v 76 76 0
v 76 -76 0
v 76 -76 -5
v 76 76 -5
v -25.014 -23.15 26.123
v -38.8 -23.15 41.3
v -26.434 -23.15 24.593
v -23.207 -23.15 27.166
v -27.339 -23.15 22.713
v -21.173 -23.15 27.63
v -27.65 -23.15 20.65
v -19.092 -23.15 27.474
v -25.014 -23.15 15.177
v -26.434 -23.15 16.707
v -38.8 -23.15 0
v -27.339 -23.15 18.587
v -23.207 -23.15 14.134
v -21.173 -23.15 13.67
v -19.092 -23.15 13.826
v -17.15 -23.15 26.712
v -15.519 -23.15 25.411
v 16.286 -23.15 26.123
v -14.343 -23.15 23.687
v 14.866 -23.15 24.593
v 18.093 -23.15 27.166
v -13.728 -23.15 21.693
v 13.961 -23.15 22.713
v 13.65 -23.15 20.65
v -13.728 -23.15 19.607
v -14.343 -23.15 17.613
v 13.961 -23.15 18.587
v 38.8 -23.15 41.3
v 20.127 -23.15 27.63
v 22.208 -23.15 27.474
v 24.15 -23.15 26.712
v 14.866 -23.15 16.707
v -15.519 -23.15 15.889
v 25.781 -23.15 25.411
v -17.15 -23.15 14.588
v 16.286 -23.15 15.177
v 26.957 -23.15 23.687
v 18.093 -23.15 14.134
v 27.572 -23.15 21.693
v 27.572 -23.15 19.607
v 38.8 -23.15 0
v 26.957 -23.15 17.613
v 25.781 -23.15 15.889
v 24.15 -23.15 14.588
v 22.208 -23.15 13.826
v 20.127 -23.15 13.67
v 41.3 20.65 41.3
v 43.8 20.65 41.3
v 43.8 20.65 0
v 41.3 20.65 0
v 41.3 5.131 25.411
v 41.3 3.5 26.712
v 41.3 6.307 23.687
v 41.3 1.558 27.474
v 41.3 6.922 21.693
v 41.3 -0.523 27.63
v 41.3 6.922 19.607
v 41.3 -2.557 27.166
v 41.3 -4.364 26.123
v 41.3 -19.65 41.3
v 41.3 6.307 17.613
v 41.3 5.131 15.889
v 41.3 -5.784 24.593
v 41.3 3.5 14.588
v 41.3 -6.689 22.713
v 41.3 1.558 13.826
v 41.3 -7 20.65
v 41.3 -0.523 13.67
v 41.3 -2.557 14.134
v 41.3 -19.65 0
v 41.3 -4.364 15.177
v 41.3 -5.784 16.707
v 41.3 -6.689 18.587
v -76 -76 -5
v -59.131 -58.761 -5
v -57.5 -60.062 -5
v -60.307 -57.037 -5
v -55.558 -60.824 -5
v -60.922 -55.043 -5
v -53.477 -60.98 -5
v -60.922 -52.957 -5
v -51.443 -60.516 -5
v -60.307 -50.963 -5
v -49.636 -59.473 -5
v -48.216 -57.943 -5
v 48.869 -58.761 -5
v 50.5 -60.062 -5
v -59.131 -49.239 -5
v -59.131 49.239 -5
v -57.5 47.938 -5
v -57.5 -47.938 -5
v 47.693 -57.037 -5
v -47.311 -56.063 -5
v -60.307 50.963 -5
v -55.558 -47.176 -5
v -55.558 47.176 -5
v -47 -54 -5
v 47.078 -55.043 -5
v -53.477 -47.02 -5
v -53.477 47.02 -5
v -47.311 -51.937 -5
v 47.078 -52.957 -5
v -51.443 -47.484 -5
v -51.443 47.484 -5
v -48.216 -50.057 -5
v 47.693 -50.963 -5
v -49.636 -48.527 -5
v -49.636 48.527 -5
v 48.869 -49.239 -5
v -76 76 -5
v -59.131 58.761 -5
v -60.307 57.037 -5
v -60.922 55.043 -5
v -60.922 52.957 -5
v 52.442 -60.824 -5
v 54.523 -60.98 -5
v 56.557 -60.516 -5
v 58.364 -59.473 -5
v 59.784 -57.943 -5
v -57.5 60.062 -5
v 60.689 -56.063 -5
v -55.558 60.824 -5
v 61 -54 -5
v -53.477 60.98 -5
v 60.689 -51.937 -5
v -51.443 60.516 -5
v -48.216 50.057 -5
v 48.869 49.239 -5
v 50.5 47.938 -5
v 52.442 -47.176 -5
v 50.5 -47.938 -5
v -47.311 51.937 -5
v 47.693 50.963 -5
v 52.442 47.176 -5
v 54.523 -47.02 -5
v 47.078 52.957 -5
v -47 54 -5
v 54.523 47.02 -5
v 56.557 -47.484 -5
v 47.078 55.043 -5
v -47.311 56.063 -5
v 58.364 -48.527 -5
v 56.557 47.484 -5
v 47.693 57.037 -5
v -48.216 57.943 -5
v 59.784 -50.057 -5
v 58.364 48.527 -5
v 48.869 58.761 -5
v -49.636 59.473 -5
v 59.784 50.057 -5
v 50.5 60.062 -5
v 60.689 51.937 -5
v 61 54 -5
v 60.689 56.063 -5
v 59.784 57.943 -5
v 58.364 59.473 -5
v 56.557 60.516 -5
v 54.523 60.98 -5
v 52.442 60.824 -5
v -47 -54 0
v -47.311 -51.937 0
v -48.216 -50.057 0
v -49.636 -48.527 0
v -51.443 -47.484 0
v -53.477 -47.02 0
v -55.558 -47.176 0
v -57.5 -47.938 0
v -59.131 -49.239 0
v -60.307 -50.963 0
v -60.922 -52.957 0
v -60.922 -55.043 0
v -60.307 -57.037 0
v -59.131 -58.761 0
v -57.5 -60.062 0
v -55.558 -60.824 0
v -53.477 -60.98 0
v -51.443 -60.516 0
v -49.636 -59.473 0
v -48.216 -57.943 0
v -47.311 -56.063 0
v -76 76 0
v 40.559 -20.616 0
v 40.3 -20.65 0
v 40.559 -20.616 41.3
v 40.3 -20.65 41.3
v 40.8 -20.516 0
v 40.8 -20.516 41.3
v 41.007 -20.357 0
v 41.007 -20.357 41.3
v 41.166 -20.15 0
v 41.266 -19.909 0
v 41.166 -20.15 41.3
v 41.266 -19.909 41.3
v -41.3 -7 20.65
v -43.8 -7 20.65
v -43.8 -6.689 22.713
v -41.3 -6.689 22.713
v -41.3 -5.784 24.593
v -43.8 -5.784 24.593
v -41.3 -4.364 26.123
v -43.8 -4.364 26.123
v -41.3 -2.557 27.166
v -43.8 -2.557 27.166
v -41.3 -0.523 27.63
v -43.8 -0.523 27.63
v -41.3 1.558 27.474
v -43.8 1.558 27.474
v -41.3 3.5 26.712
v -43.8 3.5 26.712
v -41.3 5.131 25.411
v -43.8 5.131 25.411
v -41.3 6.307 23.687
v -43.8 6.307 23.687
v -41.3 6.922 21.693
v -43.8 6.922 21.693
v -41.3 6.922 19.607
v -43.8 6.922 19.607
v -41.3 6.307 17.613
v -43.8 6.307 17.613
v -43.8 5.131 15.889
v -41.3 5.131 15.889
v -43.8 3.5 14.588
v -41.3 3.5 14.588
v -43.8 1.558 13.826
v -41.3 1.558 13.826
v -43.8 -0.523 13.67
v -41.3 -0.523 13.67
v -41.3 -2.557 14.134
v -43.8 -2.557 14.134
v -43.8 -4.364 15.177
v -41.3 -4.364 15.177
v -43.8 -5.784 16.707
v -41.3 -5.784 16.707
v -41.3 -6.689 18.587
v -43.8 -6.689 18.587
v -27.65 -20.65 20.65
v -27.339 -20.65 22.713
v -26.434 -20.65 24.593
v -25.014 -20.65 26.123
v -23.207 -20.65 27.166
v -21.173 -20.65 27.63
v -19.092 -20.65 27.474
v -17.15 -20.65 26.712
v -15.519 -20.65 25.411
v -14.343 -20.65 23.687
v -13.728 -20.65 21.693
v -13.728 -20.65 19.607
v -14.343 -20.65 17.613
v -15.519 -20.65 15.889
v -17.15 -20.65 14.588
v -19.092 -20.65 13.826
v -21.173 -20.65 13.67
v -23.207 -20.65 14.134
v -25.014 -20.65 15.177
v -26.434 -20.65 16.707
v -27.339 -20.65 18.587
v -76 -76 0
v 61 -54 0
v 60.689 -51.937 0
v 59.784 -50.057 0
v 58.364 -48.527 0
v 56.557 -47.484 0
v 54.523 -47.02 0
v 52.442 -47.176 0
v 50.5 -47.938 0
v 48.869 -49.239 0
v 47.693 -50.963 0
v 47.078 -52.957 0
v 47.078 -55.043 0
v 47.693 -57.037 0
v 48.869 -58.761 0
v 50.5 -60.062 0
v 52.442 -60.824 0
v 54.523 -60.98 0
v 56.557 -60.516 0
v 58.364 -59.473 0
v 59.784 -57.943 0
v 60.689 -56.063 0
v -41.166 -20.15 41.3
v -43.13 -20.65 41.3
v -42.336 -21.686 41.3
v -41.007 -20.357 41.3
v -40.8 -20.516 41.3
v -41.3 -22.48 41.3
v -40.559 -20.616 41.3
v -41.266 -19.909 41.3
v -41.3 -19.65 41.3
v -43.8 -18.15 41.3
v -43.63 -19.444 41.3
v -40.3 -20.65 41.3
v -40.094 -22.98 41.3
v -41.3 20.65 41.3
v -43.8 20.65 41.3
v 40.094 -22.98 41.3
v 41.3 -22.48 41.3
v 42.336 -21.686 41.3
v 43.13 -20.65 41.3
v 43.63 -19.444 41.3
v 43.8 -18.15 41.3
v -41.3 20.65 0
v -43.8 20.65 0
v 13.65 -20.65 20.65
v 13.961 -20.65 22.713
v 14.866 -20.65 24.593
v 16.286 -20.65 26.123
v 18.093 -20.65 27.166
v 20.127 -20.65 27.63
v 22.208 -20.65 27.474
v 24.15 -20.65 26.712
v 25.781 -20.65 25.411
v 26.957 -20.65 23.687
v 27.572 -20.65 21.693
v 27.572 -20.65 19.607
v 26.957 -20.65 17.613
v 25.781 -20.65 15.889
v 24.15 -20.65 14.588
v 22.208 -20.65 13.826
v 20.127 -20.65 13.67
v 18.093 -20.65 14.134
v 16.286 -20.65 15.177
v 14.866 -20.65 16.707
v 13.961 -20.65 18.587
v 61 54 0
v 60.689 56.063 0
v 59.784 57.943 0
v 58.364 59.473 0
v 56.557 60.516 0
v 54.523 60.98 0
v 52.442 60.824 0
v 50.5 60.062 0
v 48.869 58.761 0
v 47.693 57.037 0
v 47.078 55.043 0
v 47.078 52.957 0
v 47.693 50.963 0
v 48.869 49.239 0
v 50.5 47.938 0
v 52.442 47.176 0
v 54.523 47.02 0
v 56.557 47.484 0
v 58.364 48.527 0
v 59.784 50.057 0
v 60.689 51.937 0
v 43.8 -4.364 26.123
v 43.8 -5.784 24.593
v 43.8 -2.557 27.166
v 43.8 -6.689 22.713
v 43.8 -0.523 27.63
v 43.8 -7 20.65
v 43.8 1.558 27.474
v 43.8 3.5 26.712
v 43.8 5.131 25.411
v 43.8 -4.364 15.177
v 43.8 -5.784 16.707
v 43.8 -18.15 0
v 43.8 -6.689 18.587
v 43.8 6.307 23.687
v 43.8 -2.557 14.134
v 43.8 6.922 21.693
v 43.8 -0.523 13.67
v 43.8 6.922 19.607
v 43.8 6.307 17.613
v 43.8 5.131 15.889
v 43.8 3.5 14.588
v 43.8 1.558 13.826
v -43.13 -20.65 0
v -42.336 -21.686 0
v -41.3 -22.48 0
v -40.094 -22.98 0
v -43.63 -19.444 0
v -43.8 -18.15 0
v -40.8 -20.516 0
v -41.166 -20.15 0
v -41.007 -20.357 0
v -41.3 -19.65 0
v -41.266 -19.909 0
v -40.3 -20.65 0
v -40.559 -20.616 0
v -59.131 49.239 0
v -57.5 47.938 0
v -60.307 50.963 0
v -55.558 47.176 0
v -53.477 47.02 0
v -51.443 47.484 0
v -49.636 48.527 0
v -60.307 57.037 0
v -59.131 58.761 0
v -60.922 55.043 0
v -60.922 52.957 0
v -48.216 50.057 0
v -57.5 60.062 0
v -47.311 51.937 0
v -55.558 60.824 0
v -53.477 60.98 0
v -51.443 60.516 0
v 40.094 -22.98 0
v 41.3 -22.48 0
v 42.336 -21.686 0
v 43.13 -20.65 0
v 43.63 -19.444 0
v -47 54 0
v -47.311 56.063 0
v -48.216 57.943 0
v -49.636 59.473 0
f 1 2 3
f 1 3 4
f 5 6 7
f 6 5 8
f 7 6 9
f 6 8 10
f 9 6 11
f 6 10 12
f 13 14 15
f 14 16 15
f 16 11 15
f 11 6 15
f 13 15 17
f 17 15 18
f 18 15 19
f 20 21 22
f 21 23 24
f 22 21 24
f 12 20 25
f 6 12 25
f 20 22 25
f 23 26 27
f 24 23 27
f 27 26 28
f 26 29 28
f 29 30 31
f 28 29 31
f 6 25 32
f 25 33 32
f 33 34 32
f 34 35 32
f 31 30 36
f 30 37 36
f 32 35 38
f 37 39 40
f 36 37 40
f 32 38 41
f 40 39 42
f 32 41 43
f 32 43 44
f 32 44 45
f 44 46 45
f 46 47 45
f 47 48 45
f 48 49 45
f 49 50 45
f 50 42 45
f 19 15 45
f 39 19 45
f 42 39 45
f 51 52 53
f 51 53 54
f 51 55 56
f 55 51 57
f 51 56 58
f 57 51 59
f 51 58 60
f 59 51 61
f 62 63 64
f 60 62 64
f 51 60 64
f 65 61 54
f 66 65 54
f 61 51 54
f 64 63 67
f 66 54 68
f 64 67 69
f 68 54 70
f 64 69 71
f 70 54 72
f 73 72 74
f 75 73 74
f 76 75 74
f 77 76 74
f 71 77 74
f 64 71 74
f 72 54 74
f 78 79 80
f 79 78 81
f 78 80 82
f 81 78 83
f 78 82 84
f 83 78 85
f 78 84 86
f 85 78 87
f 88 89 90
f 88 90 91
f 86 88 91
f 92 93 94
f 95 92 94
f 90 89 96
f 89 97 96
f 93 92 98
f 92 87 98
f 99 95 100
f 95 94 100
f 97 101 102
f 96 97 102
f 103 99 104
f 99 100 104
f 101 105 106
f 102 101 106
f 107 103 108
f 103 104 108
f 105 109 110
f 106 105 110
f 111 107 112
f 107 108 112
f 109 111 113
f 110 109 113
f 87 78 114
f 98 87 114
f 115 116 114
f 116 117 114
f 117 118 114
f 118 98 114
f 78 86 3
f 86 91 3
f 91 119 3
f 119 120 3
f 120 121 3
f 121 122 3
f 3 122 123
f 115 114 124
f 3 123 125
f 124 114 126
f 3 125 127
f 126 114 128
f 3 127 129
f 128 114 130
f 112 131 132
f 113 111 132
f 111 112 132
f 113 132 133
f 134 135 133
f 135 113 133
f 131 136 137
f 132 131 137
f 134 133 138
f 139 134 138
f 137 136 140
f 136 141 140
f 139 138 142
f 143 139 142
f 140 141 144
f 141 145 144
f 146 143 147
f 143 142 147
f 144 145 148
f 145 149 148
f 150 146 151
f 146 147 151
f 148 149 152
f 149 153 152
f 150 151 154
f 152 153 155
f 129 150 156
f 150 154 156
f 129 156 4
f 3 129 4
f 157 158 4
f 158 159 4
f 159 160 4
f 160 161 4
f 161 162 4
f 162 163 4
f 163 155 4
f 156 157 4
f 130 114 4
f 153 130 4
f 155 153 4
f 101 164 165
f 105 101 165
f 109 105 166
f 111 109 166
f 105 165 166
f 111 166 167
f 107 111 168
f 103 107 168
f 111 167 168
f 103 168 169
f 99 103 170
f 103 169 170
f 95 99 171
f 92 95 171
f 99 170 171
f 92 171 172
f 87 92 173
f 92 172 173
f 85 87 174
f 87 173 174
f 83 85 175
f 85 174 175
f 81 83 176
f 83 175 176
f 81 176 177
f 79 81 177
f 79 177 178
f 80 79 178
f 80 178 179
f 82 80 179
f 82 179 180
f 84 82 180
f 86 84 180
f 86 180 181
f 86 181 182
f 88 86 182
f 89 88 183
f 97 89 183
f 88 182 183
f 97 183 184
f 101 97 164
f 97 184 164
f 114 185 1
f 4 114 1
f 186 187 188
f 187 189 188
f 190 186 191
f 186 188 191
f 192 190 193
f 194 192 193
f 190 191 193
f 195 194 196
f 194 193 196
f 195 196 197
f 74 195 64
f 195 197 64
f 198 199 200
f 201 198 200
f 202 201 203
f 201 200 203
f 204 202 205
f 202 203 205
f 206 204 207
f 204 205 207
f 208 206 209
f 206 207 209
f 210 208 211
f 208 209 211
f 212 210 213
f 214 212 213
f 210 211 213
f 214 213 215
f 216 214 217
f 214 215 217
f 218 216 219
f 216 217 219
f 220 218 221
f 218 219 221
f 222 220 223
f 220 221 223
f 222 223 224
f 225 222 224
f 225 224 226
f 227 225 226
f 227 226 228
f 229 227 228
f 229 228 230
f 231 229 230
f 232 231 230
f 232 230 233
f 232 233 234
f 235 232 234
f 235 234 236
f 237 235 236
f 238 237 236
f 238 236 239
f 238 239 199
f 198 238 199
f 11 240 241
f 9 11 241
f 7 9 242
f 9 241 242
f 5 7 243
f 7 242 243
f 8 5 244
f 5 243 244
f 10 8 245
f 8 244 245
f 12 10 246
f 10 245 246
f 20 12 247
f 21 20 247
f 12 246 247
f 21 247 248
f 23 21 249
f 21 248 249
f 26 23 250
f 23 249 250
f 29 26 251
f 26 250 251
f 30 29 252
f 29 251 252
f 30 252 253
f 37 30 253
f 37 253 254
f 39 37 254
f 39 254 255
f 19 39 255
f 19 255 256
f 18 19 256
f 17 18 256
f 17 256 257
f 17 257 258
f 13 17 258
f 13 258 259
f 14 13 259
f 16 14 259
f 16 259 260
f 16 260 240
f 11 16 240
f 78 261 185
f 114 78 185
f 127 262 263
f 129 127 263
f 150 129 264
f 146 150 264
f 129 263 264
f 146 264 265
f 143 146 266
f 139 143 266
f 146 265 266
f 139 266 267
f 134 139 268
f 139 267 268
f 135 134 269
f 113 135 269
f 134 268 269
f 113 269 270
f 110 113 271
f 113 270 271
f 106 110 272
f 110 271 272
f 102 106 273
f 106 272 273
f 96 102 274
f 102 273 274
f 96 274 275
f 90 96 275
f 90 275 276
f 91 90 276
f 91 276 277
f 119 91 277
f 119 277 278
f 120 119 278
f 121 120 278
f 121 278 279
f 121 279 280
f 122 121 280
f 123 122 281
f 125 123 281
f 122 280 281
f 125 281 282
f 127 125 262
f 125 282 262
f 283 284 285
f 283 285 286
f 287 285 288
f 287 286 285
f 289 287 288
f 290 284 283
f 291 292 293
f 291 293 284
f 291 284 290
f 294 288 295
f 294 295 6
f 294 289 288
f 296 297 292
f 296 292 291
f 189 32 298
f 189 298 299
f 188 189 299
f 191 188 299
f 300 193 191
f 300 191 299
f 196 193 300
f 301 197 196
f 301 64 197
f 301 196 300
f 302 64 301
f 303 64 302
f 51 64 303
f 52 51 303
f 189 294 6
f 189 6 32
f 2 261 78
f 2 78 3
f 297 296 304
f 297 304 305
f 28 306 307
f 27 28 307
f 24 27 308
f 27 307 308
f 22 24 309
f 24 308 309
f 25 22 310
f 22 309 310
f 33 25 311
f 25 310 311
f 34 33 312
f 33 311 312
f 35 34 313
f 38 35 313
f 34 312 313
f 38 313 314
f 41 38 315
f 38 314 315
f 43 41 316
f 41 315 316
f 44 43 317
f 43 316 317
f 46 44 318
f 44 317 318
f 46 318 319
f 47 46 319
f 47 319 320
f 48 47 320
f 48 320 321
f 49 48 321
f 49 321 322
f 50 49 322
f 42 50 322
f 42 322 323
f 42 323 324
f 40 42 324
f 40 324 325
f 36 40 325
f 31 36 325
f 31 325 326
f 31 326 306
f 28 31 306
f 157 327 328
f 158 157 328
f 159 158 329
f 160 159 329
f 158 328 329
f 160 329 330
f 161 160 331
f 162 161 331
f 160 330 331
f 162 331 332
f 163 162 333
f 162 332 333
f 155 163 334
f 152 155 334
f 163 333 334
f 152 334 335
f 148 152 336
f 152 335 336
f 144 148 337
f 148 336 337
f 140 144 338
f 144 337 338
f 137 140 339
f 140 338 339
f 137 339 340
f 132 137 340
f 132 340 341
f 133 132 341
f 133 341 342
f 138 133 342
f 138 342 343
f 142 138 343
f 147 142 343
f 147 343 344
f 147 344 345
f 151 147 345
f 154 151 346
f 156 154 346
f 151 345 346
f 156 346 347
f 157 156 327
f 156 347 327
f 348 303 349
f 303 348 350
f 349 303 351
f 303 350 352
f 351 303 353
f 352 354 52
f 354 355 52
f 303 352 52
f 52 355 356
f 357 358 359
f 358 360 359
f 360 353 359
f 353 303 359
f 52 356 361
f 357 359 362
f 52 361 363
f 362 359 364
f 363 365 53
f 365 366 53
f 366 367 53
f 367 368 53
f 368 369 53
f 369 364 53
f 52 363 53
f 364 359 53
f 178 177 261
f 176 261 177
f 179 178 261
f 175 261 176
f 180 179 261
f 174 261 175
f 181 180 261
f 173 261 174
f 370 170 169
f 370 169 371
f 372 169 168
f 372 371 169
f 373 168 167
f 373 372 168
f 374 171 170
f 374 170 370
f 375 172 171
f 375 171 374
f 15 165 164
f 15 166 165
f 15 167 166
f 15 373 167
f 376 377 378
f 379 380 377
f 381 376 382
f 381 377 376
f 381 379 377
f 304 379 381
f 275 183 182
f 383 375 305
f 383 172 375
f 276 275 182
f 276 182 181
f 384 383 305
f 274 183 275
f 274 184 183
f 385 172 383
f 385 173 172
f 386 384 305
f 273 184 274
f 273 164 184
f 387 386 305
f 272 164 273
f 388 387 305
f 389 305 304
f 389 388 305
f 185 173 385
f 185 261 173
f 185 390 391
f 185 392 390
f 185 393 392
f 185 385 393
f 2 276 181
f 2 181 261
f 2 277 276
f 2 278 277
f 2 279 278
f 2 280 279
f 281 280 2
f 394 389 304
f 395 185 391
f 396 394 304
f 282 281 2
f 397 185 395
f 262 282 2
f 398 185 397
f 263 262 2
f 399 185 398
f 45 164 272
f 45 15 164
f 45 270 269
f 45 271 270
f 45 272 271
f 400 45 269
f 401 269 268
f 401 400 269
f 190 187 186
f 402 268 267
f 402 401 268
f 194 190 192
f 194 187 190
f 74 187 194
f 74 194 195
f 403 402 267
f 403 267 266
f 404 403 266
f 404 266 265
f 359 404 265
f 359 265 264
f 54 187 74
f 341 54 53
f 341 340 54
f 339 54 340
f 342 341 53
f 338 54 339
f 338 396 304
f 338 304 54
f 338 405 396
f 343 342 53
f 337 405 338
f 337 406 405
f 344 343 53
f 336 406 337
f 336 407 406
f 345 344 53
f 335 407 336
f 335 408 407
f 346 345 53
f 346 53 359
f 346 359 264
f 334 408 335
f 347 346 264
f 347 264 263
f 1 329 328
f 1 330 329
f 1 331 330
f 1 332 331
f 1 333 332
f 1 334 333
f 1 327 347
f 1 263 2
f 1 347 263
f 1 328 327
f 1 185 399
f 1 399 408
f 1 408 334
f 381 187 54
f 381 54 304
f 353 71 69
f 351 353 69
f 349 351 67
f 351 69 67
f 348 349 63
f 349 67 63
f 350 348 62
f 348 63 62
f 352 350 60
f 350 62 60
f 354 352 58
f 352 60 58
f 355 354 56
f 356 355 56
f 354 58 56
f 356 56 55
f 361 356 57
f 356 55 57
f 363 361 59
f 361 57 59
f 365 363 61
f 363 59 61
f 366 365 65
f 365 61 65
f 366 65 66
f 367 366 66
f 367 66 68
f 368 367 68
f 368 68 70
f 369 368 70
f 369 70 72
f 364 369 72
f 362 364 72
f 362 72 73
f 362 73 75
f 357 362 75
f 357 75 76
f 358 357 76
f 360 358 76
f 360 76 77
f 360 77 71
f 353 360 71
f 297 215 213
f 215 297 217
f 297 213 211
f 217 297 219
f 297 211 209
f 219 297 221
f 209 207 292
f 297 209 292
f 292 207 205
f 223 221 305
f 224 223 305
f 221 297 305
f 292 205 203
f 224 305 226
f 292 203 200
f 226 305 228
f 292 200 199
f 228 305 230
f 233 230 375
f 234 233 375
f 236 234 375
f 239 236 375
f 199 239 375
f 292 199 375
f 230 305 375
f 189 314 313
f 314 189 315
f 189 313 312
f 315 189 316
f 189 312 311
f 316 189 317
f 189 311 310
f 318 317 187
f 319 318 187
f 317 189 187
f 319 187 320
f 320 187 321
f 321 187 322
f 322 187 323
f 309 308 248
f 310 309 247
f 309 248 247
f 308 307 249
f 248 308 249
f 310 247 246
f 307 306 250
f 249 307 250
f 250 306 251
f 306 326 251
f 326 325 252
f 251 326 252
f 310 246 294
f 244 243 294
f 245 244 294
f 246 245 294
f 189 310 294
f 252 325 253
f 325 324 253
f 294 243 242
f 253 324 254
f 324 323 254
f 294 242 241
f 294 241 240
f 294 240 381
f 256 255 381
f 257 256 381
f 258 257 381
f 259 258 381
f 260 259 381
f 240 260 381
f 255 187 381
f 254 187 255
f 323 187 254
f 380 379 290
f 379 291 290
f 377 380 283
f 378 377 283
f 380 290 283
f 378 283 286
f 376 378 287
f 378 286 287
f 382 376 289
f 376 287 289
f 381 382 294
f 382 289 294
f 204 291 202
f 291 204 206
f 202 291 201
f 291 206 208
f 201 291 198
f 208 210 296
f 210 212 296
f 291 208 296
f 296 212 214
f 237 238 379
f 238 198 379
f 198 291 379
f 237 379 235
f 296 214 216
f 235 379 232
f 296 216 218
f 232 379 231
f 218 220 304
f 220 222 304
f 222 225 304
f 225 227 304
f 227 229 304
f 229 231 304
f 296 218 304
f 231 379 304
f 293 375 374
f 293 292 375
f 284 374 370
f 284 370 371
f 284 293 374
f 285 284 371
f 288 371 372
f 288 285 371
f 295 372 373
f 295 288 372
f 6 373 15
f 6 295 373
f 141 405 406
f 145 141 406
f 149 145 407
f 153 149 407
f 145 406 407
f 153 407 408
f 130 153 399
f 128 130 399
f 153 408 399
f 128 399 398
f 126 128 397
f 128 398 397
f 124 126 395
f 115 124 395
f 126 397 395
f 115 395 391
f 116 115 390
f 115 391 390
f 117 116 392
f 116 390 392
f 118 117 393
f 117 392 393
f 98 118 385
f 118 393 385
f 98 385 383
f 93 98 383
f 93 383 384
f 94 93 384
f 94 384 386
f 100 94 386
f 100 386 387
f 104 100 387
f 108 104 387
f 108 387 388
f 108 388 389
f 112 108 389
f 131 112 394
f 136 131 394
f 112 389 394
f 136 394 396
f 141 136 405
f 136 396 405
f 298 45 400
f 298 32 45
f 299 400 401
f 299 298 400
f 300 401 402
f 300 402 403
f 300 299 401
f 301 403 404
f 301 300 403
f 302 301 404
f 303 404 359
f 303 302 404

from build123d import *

# Parameters (mm, degrees)
F0_W     = 152
F0_H     = 152
F0_R     = 7
F1_DEPTH = 5
F3_DEPTH = 41.3
F4_R     = 5
F5_R     = 1
F7_D     = 14
F9_D     = 14


with BuildPart() as f1:
    # F0 (on Top) → F1 (new body)
    with BuildSketch(Plane.XY):
        Rectangle(F0_W, F0_H)
        with Locations((-54, -54)):
            Circle(F0_R, mode=Mode.SUBTRACT)
        with Locations((54, -54)):
            Circle(F0_R, mode=Mode.SUBTRACT)
        with Locations((-54, 54)):
            Circle(F0_R, mode=Mode.SUBTRACT)
        with Locations((54, 54)):
            Circle(F0_R, mode=Mode.SUBTRACT)
    extrude(amount=-F1_DEPTH)

    # F2 (on face) → F3 (join)
    with BuildSketch(Plane.XY):
        Polygon((-41.3, 20.65), (-43.8, 20.65), (-43.8, -23.15), (43.8, -23.15), (43.8, 20.65), (41.3, 20.65), (41.3, -20.65), (-41.3, -20.65), align=None)
    extrude(amount=F3_DEPTH)

    # F4
    f4_edges = [f1.edges().sort_by_distance(p)[0] for p in [
        (43.8, -23.15, 20.65),
        (-43.8, -23.15, 20.65),
    ]]
    fillet(f4_edges, radius=F4_R)

    # F5
    f5_edges = [f1.edges().sort_by_distance(p)[0] for p in [
        (41.3, -20.65, 20.65),
        (-41.3, -20.65, 20.65),
    ]]
    fillet(f5_edges, radius=F5_R)

    # F7 (through all)
    with Locations(Plane.YZ.offset(43.8)):
        with Locations((0, 20.65)):
            Hole(F7_D / 2)

    # F9 (through all)
    with Locations(Plane.XZ.offset(23.15)):
        with Locations((-20.65, 20.65), (20.65, 20.65)):
            Hole(F9_D / 2)


solid = f1.part
